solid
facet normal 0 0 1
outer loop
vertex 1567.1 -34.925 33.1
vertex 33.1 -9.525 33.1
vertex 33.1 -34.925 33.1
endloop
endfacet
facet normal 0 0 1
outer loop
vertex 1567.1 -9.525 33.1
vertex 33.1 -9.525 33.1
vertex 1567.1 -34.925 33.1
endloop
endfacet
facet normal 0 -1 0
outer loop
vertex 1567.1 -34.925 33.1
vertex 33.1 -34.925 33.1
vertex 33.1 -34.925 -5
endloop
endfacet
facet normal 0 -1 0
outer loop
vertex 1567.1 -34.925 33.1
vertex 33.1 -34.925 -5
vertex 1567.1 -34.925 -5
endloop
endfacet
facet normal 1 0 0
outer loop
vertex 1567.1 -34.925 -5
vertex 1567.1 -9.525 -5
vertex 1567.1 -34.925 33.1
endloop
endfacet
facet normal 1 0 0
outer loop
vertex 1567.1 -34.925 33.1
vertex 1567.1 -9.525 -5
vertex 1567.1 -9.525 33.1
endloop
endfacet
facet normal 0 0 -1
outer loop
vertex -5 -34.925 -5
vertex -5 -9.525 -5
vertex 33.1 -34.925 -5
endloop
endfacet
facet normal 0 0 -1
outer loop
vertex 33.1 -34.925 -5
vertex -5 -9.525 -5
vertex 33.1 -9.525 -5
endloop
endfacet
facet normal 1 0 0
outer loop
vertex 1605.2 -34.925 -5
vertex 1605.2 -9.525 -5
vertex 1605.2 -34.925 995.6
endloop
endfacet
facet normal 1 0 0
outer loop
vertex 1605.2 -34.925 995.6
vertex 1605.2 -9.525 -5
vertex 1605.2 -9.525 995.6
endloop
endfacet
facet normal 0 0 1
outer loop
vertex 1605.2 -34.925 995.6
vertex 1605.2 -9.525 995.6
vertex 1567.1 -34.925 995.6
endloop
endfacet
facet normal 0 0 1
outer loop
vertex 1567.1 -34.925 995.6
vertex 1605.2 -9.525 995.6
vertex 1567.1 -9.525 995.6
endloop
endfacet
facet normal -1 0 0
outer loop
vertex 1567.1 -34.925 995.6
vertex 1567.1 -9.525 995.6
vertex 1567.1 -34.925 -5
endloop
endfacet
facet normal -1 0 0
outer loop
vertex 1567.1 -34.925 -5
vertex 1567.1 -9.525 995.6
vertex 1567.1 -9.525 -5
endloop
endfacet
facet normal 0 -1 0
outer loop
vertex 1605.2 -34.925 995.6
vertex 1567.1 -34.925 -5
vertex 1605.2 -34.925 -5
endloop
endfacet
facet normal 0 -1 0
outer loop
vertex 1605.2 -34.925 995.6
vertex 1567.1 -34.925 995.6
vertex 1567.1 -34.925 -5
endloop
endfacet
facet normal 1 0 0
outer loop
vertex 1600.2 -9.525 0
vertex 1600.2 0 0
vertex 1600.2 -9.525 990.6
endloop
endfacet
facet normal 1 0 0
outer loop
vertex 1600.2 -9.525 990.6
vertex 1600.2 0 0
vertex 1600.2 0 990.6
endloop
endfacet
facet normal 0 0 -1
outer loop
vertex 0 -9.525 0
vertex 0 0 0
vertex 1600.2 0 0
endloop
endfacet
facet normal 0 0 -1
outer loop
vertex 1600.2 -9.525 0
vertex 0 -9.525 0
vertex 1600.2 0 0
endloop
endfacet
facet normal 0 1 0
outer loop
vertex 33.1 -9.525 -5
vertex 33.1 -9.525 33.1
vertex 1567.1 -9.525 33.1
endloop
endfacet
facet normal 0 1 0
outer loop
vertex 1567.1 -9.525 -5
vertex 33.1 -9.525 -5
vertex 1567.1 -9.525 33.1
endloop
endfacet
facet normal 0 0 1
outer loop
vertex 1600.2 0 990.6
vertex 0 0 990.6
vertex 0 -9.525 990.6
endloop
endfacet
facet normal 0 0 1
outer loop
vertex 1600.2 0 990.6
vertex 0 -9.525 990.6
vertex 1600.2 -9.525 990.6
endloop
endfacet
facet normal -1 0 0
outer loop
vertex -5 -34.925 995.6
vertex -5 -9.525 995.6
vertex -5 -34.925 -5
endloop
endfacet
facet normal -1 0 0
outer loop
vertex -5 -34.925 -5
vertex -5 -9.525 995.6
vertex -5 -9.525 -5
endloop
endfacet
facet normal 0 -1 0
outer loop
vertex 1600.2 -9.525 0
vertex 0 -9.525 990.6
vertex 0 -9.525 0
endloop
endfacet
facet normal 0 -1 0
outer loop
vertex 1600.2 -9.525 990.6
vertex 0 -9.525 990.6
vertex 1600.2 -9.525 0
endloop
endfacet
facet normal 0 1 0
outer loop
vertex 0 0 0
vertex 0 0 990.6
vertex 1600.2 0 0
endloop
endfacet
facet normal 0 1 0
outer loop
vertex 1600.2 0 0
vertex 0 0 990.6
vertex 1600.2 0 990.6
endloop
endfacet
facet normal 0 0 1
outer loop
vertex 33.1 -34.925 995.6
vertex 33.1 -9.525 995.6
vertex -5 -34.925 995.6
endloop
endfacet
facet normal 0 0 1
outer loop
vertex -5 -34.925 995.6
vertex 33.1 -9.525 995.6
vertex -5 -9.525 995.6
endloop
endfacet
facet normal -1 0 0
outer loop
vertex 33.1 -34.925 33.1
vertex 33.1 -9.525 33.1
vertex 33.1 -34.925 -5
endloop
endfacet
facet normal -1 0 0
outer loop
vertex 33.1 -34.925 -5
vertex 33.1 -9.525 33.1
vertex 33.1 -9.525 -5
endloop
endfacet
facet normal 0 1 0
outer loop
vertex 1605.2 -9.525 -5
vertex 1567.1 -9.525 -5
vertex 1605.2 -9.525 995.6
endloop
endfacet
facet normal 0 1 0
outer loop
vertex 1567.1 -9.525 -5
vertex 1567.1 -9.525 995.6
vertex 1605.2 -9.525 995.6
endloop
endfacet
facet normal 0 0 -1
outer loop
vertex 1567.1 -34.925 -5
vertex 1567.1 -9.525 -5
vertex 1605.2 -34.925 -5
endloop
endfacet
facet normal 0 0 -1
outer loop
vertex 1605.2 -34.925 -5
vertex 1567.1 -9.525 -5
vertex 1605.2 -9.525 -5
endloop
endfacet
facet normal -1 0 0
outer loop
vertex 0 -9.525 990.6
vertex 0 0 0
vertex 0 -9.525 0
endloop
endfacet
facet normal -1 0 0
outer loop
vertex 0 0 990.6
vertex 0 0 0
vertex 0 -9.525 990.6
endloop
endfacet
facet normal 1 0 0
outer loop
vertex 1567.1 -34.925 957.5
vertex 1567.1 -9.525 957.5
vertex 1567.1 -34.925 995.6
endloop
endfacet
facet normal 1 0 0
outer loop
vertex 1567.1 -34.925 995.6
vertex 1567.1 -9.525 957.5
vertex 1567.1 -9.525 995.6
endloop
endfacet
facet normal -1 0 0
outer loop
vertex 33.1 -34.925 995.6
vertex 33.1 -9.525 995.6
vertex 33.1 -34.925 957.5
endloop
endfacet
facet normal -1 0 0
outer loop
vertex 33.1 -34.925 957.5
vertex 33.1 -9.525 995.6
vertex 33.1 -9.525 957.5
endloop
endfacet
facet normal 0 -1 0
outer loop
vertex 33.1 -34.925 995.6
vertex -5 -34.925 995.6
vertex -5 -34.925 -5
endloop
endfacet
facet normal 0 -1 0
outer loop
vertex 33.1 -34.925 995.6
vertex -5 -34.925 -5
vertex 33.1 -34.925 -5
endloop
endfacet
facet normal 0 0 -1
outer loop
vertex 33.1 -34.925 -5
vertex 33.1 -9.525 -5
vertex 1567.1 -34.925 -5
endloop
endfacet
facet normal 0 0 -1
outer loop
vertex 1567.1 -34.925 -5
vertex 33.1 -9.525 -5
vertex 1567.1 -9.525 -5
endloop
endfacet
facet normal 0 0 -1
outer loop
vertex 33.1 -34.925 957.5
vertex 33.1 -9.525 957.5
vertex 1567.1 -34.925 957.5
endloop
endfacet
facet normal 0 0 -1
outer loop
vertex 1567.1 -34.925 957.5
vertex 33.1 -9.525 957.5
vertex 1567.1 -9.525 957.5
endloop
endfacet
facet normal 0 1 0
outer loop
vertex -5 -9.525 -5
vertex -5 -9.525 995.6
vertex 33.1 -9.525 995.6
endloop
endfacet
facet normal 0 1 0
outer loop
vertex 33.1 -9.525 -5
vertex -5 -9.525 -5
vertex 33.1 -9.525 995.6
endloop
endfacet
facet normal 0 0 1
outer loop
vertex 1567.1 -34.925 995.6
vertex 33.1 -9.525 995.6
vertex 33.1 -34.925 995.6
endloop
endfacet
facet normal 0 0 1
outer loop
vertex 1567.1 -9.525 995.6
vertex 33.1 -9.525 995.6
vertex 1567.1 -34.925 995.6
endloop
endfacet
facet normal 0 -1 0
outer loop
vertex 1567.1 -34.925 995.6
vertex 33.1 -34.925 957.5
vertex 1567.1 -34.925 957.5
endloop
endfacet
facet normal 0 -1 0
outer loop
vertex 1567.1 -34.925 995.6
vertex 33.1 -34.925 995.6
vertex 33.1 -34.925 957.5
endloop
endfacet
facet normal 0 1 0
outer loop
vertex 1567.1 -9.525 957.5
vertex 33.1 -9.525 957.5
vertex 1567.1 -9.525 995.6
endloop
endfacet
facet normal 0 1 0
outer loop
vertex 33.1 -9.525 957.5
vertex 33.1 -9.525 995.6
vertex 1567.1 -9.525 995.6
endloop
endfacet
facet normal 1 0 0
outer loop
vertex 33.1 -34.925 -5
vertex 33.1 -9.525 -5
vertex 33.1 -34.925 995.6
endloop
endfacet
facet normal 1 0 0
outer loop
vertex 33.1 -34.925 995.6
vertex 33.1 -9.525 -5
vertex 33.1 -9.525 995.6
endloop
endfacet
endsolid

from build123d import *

# Parameters (mm, degrees)
F2_W     = 1600.2
F2_H     = 990.6
F3_DEPTH = 9.525
F5_DEPTH = 25.4
F4_W     = 1534
F4_H     = 33.1
F4_H_2   = 5
F6_DEPTH = 25.4
F7_DEPTH = 25.4
F8_DEPTH = 25.4


# Not quite as in the source:
# - a length typed as a fraction of an inch, garbled in the dataset ("3 / 203.2 mm" for 3/8 in), is restored


with BuildPart() as f3:
    # F2 (on Front) → F3 (new body)
    with BuildSketch(Plane.XZ):
        with Locations((800.1, 495.3)):
            Rectangle(F2_W, F2_H)
    extrude(amount=F3_DEPTH)


with BuildPart() as f5:
    # F4 (on face) → F5 (new body)
    with BuildSketch(Plane.XZ.offset(9.525)):
        Polygon((33.1, 957.5), (33.1, 990.6), (0, 990.6), (0, 0), (33.1, 0), (33.1, 33.1), align=None)
        Polygon((33.1, 995.6), (-5, 995.6), (-5, -5), (33.1, -5), (33.1, 0), (0, 0), (0, 990.6), (33.1, 990.6), align=None)
    extrude(amount=F5_DEPTH)


with BuildPart() as f6:
    # F4 (on face) → F6 (new body)
    with BuildSketch(Plane.XZ.offset(9.525)):
        with Locations((800.1, 974.05)):
            Rectangle(F4_W, F4_H)
        with Locations((800.1, 993.1)):
            Rectangle(F4_W, F4_H_2)
    extrude(amount=F6_DEPTH)


with BuildPart() as f7:
    # F4 (on face) → F7 (new body)
    with BuildSketch(Plane.XZ.offset(9.525)):
        Polygon((1600.2, 990.6), (1567.1, 990.6), (1567.1, 957.5), (1567.1, 33.1), (1567.1, 0), (1600.2, 0), align=None)
        Polygon((1605.2, 995.6), (1567.1, 995.6), (1567.1, 990.6), (1600.2, 990.6), (1600.2, 0), (1567.1, 0), (1567.1, -5), (1605.2, -5), align=None)
    extrude(amount=F7_DEPTH)


with BuildPart() as f8:
    # F4 (on face) → F8 (new body)
    with BuildSketch(Plane.XZ.offset(9.525)):
        with Locations((800.1, 16.55)):
            Rectangle(F4_W, F4_H)
        with Locations((800.1, -2.5)):
            Rectangle(F4_W, F4_H_2)
    extrude(amount=F8_DEPTH)


solid = Compound([f3.part, f5.part, f6.part, f7.part, f8.part])
